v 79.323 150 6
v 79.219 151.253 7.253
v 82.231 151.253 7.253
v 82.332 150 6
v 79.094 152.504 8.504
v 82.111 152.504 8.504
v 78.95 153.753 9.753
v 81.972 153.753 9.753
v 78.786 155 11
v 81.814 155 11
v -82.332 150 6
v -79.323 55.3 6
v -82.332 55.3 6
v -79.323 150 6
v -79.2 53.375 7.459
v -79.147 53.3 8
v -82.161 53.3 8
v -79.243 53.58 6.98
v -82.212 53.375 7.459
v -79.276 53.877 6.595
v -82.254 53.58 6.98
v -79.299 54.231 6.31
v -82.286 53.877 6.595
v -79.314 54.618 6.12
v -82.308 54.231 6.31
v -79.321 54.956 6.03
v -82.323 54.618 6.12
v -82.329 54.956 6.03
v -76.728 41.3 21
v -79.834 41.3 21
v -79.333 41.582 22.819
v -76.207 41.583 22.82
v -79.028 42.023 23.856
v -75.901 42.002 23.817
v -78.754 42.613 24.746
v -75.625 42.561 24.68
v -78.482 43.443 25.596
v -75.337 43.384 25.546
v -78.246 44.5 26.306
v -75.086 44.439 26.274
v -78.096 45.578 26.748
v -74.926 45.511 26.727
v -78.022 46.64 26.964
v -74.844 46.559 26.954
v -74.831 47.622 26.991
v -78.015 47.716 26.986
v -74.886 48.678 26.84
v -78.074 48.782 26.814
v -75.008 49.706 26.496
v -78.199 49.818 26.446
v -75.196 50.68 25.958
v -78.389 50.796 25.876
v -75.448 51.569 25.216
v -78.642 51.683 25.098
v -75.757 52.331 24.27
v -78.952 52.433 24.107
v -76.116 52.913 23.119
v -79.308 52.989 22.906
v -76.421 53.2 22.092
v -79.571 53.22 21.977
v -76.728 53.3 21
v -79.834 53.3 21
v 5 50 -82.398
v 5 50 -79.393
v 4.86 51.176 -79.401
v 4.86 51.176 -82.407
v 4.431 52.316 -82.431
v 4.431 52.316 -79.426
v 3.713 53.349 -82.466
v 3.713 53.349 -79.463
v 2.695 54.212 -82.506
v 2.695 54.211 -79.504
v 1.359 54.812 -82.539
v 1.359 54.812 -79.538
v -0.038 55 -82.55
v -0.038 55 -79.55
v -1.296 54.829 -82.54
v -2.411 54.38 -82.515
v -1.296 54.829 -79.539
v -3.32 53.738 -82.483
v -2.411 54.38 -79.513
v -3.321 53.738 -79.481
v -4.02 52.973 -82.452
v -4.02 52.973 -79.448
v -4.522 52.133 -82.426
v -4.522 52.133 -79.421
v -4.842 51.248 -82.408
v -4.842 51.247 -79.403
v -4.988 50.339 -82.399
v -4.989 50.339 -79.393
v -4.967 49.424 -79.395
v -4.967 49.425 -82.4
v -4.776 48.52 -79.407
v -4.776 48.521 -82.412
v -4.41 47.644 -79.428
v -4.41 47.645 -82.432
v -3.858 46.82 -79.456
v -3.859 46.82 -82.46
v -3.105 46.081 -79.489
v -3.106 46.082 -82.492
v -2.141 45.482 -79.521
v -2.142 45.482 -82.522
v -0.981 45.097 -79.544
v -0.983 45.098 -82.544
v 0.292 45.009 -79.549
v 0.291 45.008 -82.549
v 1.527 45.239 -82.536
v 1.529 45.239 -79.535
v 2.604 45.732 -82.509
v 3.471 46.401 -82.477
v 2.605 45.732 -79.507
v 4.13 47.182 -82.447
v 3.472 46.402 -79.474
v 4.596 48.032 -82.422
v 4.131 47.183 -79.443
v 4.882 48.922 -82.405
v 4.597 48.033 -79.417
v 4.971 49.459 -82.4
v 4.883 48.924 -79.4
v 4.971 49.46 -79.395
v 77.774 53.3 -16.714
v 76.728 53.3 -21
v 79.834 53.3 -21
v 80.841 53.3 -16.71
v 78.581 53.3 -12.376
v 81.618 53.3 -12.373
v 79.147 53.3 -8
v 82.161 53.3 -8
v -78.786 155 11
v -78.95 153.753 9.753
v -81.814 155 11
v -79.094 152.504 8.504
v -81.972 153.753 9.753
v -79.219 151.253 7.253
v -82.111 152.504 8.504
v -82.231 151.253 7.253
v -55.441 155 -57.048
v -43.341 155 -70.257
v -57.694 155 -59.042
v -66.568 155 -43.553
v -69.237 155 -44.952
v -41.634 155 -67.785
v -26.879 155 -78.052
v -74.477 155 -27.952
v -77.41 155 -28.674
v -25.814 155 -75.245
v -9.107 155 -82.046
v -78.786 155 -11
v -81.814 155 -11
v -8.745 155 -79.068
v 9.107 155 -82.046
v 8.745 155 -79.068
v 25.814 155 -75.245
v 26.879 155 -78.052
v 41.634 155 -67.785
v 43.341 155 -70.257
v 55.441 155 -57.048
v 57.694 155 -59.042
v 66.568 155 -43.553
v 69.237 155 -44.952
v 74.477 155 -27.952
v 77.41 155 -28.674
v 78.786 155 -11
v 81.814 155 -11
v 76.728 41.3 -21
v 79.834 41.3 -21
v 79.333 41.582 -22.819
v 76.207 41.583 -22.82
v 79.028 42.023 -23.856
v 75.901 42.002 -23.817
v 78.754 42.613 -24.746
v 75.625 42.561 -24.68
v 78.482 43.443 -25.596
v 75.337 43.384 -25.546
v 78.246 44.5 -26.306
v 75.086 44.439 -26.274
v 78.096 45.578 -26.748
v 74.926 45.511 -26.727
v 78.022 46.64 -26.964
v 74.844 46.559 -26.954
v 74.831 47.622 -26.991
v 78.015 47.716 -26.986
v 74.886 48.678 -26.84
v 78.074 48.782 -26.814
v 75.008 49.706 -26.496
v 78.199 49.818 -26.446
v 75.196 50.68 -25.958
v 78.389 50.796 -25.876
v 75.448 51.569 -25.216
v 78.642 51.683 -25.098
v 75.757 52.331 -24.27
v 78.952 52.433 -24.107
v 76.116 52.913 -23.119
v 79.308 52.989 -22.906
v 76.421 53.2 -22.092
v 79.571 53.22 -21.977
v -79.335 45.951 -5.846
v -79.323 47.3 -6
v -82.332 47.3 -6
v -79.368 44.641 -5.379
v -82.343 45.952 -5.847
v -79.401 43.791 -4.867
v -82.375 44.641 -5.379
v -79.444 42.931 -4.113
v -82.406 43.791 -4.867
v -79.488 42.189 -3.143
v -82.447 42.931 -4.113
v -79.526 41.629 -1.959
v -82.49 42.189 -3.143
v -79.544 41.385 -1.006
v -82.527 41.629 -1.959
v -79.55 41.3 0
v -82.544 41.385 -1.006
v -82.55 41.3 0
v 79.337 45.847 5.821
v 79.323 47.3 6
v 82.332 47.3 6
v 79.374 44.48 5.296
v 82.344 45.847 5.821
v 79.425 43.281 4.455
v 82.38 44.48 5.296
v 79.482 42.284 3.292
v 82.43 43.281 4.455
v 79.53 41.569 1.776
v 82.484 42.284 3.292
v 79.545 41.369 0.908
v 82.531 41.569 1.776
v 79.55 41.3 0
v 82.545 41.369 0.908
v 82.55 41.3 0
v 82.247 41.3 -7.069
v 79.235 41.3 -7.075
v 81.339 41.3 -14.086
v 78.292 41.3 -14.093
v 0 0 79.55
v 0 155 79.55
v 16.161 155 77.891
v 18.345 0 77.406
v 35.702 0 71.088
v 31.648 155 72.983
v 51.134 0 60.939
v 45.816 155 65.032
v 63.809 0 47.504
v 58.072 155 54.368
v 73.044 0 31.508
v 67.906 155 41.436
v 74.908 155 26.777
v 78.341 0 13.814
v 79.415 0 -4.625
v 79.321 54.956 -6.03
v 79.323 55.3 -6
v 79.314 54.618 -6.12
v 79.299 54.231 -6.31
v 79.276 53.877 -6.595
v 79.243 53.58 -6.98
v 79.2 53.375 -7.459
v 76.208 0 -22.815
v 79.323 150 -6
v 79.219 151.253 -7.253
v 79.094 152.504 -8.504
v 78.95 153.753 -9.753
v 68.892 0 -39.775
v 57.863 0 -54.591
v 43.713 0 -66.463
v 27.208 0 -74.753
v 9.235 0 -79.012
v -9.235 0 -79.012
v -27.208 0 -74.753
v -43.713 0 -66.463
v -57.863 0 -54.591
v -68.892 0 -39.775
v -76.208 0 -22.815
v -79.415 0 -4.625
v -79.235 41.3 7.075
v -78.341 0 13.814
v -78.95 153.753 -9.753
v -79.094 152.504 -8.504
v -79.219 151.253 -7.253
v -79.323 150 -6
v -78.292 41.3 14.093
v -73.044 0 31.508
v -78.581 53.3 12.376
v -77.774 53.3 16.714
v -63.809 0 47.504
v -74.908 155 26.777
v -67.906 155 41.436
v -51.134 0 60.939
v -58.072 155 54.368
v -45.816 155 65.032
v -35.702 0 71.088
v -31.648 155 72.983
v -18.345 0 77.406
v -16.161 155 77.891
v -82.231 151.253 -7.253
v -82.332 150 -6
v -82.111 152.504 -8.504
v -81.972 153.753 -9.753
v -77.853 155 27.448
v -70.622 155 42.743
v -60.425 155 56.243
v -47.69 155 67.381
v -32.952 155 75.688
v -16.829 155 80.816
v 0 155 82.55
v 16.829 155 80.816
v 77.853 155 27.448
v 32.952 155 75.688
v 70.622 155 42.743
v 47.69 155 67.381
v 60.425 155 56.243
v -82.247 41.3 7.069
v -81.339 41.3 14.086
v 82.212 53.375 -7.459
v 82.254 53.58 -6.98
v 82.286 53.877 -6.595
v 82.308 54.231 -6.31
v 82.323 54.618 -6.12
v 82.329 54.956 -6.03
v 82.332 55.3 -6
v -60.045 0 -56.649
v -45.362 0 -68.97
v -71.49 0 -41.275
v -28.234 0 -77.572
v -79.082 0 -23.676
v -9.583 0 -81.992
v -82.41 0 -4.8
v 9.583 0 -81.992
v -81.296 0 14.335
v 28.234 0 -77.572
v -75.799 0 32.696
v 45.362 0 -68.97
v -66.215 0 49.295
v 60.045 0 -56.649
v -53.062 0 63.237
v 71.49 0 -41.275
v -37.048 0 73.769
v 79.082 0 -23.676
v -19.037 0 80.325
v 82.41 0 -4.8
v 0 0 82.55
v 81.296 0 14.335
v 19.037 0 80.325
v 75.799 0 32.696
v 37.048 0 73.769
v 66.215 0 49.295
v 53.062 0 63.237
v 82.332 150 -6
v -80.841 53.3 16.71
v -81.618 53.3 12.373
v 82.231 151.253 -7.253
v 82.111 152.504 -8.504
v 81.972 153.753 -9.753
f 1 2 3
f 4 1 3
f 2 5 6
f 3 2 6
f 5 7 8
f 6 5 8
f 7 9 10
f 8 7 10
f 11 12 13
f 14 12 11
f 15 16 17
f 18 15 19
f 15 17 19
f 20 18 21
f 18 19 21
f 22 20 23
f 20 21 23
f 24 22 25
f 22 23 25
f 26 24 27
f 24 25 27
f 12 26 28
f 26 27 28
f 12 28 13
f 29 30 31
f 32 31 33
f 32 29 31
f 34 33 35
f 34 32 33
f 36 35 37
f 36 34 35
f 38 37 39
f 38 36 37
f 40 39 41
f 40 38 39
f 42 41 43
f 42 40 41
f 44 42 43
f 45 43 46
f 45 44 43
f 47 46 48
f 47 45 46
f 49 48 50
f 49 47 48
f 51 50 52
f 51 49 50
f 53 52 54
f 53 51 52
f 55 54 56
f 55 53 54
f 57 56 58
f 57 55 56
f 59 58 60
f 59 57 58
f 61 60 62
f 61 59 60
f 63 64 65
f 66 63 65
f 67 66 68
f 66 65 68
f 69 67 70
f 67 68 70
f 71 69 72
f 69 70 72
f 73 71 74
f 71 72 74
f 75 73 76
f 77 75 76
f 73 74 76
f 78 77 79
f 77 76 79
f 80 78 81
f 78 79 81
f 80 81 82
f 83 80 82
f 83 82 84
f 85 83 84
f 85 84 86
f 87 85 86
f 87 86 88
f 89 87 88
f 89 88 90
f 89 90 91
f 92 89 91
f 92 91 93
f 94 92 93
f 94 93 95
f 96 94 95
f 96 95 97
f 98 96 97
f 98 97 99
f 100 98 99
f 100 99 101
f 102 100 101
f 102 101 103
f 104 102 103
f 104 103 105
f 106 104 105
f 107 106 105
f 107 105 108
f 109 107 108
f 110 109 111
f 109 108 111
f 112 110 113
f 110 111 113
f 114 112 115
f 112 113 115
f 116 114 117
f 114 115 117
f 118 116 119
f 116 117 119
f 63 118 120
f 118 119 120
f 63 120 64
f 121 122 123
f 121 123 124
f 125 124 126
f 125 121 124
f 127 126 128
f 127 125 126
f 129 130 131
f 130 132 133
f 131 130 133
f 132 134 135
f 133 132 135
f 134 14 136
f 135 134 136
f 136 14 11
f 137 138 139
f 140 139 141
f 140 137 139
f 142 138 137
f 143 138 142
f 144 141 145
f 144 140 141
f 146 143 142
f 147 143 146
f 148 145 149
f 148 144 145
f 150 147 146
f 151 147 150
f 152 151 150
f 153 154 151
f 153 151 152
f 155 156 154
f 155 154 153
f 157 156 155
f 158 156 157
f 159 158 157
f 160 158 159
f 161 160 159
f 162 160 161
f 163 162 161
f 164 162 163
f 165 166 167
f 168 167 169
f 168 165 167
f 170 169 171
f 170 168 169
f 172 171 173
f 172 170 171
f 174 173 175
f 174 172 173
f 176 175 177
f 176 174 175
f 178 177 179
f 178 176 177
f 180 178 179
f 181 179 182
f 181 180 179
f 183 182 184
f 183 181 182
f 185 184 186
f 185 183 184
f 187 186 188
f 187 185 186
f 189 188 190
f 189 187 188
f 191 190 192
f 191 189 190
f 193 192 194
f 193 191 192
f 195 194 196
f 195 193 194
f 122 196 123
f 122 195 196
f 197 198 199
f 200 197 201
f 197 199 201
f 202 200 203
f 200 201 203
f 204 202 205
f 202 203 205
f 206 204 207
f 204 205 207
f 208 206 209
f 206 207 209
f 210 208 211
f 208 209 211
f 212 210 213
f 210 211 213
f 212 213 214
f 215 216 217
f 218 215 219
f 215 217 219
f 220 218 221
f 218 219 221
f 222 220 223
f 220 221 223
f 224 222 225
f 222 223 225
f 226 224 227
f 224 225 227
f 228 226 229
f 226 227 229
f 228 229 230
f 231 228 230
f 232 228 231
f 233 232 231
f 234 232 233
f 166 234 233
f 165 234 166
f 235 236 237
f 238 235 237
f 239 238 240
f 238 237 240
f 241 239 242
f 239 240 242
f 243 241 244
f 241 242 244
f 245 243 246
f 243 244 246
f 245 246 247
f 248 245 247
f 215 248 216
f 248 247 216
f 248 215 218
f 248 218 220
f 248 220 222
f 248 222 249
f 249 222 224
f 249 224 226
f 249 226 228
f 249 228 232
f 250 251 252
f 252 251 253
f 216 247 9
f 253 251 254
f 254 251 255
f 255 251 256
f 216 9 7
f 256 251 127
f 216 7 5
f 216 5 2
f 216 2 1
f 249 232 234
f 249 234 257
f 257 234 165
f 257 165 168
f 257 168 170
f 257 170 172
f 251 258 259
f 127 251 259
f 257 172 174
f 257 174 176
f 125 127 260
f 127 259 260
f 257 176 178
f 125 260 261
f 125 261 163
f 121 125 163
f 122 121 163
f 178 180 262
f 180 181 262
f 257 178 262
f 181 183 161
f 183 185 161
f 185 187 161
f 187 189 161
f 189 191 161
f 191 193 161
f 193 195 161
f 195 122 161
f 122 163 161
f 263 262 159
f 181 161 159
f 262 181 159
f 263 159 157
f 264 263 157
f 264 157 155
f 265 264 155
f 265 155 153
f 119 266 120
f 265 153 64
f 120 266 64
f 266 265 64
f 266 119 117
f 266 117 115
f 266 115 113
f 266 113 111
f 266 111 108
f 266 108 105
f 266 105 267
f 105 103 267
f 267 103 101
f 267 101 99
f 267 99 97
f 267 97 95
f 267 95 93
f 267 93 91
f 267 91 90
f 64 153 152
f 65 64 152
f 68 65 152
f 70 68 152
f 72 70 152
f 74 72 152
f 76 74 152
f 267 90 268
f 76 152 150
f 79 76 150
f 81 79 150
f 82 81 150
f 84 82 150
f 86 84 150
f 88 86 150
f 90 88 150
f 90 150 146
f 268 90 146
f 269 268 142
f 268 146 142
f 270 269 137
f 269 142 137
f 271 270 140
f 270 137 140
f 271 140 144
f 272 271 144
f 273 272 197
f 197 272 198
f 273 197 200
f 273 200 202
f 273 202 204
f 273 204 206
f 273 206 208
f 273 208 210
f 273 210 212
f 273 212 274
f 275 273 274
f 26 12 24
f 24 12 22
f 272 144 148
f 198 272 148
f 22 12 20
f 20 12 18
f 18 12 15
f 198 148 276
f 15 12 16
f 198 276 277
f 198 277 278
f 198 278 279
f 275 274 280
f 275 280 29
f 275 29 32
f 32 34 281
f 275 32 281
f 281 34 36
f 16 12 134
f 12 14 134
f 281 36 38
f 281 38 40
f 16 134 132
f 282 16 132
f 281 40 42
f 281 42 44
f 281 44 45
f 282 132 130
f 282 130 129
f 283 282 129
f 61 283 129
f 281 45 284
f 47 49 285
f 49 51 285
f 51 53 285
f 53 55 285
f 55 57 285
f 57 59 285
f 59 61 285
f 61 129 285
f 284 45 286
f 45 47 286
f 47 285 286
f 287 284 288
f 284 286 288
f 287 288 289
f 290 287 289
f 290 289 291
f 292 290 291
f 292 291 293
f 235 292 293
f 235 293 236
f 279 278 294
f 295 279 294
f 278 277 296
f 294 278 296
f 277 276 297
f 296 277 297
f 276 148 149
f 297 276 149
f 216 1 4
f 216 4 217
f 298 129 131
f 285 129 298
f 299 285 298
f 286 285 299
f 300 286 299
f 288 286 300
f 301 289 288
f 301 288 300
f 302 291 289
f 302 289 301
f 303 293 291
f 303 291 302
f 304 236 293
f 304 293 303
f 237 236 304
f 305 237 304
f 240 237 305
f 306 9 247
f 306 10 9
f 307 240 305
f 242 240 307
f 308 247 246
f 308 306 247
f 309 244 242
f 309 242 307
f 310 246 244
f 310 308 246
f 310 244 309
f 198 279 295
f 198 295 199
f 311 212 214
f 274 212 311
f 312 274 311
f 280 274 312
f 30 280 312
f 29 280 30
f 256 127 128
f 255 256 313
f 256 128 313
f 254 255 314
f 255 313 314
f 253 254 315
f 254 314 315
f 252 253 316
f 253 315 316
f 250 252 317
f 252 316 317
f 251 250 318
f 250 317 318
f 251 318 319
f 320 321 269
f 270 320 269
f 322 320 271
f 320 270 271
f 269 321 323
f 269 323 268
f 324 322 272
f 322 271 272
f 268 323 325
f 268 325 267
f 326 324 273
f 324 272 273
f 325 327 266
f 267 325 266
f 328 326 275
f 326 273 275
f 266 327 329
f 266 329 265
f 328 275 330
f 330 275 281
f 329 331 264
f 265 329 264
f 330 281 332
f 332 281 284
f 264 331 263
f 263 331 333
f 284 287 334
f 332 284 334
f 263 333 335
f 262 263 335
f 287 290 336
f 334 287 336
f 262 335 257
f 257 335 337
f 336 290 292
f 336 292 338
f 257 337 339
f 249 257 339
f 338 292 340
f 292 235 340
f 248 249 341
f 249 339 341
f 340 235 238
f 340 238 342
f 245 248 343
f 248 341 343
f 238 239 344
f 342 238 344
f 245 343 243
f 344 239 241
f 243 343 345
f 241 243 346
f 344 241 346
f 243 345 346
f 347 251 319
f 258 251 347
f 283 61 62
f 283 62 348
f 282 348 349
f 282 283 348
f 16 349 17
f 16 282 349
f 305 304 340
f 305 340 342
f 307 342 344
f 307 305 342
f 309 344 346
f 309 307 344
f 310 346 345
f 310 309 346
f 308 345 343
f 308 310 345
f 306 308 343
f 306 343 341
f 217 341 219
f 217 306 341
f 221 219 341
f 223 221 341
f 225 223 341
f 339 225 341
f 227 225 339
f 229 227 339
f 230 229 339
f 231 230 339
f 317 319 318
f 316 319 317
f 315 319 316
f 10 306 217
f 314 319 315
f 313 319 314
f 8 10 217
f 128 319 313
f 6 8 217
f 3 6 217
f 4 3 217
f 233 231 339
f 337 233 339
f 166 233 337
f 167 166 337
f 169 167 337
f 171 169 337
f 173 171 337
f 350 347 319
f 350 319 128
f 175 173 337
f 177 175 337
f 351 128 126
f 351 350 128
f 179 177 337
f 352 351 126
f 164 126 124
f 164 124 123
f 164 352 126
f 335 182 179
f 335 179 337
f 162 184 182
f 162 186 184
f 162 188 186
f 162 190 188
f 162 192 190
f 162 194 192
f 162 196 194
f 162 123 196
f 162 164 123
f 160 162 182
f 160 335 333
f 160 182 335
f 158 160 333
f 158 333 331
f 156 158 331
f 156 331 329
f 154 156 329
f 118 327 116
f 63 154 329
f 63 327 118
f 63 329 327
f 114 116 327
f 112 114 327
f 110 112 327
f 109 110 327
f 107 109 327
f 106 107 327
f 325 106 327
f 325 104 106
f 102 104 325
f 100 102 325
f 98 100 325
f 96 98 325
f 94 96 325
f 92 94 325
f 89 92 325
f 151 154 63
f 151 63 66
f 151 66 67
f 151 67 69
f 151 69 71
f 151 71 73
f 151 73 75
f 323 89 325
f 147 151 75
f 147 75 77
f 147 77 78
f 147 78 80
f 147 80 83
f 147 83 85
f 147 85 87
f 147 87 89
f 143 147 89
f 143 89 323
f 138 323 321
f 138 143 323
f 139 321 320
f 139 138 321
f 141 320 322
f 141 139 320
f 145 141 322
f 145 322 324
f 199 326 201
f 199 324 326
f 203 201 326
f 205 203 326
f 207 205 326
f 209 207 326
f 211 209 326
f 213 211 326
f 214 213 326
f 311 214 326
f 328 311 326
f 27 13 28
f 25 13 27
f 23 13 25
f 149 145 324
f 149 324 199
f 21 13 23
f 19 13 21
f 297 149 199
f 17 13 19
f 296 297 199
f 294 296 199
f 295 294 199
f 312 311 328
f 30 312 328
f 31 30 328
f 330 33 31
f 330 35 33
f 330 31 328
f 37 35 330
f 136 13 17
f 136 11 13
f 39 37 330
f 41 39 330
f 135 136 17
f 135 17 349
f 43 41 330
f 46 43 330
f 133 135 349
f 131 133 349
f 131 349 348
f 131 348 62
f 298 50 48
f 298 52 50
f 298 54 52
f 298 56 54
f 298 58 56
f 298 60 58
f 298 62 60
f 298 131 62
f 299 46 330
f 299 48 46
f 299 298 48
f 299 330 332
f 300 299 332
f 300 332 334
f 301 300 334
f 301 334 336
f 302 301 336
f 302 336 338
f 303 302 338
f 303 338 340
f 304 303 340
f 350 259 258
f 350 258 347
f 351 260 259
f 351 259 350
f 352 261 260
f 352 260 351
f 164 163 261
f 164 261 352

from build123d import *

# Parameters (mm, degrees)
SKETCH2_W                    = 3
SKETCH2_H                    = 155
CUT_EXTRUDE1_DEPTH           = 83.55
FILLET1_R                    = 6
CHAMFER1_SIZE                = 5
FILLET4_R                    = 2
CIRPATTERN1_COUNT            = 2
FILLET1_OF_CIRPATTERN1_R     = 6
CHAMFER1_OF_CIRPATTERN1_SIZE = 5
FILLET4_OF_CIRPATTERN1_R     = 2
SKETCH4_R                    = 5
CUT_EXTRUDE2_DEPTH           = 100


with BuildPart() as part:
    # Sketch2 → Revolve1 (revolve)
    with BuildSketch(Plane(origin=(0, 0, 0), x_dir=(0, 0, -1), z_dir=(1, 0, 0))):
        with Locations((-81.05, 77.5)):
            Rectangle(SKETCH2_W, SKETCH2_H)
    revolve(axis=Axis((0, -7.75, 0), (0, 1, 0)))

    # Sketch3 → Cut-Extrude1 (cut, through all)
    with BuildSketch(Plane(origin=(0, 0, 0), x_dir=(0, 0, -1), z_dir=(1, 0, 0))):
        with BuildLine():
            Line((-6, 155), (6, 155))
            Line((6, 155), (6, 41.3))
            Line((6, 41.3), (-21, 41.3))
            ThreePointArc((-21, 41.3), (-27, 47.3), (-21, 53.3))
            Line((-21, 53.3), (-6, 53.3))
            Line((-6, 53.3), (-6, 155))
        make_face()
    cut_extrude1 = extrude(amount=-CUT_EXTRUDE1_DEPTH, mode=Mode.SUBTRACT)

    # Fillet1
    fillet1_edges = [part.edges().sort_by_distance(p)[0] for p in [
        (-80.82753304, 41.3, -6),
    ]]
    fillet(fillet1_edges, radius=FILLET1_R)

    # Chamfer1
    chamfer1_edges = [part.edges().sort_by_distance(p)[0] for p in [
        (-80.82753304, 155, -6),
        (-80.82753304, 155, 6),
    ]]
    chamfer(chamfer1_edges, length=CHAMFER1_SIZE)

    # Fillet4
    fillet4_edges = [part.edges().sort_by_distance(p)[0] for p in [
        (-80.82753304, 53.3, 6),
    ]]
    fillet(fillet4_edges, radius=FILLET4_R)

    # CirPattern1: Cut-Extrude1 ×2 about axis
    cirpattern1_axis = Axis((0, -7.75, 0), (0, 1, 0))
    for i in range(1, CIRPATTERN1_COUNT):
        add(cut_extrude1.rotate(cirpattern1_axis, i * 360 / CIRPATTERN1_COUNT), mode=Mode.SUBTRACT)

    # Fillet1 of CirPattern1
    fillet1_of_cirpattern1_edges = [part.edges().sort_by_distance(p)[0] for p in [
        (80.82753304, 41.3, 6),
    ]]
    fillet(fillet1_of_cirpattern1_edges, radius=FILLET1_OF_CIRPATTERN1_R)

    # Chamfer1 of CirPattern1
    chamfer1_of_cirpattern1_edges = [part.edges().sort_by_distance(p)[0] for p in [
        (80.82753304, 155, 6),
        (80.82753304, 155, -6),
    ]]
    chamfer(chamfer1_of_cirpattern1_edges, length=CHAMFER1_OF_CIRPATTERN1_SIZE)

    # Fillet4 of CirPattern1
    fillet4_of_cirpattern1_edges = [part.edges().sort_by_distance(p)[0] for p in [
        (80.82753304, 53.3, -6),
    ]]
    fillet(fillet4_of_cirpattern1_edges, radius=FILLET4_OF_CIRPATTERN1_R)

    # Sketch4 → Cut-Extrude2 (cut)
    with BuildSketch(Plane.XY):
        with Locations((0, 50)):
            Circle(SKETCH4_R)
    extrude(amount=-CUT_EXTRUDE2_DEPTH, mode=Mode.SUBTRACT)


solid = part.part
